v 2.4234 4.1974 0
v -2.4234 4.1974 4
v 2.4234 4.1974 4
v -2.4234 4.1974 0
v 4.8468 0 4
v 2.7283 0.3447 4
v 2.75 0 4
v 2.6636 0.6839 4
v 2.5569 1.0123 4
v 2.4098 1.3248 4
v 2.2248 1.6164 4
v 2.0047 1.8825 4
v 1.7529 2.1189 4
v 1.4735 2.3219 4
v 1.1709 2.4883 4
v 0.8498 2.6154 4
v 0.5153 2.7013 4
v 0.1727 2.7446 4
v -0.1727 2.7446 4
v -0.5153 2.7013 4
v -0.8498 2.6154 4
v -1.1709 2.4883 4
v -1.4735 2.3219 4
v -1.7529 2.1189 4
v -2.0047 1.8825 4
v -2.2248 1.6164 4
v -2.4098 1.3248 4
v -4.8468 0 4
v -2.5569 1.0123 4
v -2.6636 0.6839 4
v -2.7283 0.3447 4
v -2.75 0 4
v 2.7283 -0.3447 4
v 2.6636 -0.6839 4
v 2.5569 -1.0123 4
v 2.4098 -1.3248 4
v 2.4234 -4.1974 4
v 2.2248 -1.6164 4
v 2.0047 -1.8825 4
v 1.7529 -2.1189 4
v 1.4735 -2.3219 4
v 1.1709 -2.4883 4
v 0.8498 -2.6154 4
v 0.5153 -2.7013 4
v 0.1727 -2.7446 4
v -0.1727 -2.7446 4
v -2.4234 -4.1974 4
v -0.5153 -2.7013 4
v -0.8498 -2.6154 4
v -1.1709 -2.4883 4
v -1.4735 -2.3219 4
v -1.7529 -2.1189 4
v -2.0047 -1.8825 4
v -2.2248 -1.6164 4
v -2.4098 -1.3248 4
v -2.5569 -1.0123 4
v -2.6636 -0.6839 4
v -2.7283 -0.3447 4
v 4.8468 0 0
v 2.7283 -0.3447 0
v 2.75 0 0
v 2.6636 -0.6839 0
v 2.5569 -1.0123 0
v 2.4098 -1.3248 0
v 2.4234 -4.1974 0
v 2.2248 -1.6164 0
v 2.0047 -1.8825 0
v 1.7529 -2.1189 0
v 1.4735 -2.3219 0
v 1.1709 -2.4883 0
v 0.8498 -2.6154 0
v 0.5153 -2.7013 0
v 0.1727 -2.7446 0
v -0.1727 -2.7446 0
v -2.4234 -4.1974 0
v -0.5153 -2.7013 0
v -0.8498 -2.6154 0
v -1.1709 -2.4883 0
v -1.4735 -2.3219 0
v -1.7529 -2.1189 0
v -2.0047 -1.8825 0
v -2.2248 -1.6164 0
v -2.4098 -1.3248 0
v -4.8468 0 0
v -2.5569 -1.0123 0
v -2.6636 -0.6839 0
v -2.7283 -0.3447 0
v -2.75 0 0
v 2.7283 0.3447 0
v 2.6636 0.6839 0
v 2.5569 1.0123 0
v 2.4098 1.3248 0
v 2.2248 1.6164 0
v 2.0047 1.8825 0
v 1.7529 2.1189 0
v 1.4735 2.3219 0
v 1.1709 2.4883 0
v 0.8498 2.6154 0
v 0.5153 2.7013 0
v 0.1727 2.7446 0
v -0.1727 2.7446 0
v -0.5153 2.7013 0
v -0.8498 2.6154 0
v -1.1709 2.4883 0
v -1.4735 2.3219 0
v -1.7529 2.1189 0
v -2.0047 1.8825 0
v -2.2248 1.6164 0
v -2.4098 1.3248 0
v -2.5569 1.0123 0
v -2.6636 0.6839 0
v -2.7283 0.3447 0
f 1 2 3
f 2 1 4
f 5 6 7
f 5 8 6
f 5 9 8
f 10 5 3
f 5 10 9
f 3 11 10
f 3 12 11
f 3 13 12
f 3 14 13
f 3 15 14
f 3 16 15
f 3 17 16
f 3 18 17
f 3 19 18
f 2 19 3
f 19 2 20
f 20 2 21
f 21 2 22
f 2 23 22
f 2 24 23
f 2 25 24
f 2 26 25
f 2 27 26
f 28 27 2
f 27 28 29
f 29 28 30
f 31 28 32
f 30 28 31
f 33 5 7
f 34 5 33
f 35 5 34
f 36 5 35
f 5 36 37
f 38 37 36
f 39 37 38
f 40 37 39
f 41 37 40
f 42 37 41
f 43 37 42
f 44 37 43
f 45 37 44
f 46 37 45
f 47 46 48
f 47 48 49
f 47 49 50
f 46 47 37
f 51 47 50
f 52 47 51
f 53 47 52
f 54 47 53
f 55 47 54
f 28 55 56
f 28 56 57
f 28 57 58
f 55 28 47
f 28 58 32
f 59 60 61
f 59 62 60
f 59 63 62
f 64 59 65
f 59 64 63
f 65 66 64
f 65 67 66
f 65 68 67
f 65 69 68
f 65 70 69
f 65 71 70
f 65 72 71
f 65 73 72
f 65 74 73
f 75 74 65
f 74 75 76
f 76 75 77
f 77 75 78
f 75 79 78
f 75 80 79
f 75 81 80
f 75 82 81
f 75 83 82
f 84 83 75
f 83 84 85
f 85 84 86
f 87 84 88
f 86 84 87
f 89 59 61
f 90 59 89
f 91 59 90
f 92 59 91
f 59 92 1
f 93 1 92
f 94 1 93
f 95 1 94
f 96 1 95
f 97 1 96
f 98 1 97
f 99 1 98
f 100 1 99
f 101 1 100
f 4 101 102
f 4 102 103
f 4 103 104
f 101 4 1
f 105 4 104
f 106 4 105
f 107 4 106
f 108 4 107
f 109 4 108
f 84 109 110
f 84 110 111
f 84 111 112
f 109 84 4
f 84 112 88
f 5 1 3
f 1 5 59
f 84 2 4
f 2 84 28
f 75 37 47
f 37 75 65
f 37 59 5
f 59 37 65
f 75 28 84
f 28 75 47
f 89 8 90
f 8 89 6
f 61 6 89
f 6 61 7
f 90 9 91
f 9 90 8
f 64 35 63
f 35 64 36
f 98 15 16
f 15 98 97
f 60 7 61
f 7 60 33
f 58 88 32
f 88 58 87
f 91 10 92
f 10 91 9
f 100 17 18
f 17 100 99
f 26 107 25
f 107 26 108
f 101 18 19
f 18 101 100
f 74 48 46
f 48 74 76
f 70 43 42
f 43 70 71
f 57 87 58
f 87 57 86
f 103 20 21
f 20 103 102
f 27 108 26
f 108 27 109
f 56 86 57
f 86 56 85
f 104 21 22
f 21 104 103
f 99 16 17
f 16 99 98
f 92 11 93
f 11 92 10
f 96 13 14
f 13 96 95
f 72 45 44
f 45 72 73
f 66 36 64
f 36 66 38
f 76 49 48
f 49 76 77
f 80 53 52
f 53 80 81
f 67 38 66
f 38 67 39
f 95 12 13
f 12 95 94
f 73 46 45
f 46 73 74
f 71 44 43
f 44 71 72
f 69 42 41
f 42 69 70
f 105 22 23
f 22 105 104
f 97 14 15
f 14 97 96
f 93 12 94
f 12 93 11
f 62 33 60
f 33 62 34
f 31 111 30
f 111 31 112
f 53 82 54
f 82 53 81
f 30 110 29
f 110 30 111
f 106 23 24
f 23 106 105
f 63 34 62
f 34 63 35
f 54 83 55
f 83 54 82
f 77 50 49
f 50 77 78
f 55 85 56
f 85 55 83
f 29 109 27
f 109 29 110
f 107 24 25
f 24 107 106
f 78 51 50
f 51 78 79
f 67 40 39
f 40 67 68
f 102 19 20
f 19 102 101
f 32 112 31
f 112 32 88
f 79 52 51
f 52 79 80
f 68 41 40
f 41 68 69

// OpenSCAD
$fn = 50;


difference() {
	union() {
		translate(v = [0, 0, 0]) {
			rotate(a = [0, 0, 0]) {
				difference() {
					union() {
						linear_extrude(height = 4) {
							polygon(points = [[4.8468000000, 0.0000000000], [2.4234000000, 4.1974519271], [-2.4234000000, 4.1974519271], [-4.8468000000, 0.0000000000], [-2.4234000000, -4.1974519271], [2.4234000000, -4.1974519271]]);
						}
					}
					union();
				}
			}
		}
	}
	union() {
		cylinder(h = 100, r = 2.7500000000);
	}
}
